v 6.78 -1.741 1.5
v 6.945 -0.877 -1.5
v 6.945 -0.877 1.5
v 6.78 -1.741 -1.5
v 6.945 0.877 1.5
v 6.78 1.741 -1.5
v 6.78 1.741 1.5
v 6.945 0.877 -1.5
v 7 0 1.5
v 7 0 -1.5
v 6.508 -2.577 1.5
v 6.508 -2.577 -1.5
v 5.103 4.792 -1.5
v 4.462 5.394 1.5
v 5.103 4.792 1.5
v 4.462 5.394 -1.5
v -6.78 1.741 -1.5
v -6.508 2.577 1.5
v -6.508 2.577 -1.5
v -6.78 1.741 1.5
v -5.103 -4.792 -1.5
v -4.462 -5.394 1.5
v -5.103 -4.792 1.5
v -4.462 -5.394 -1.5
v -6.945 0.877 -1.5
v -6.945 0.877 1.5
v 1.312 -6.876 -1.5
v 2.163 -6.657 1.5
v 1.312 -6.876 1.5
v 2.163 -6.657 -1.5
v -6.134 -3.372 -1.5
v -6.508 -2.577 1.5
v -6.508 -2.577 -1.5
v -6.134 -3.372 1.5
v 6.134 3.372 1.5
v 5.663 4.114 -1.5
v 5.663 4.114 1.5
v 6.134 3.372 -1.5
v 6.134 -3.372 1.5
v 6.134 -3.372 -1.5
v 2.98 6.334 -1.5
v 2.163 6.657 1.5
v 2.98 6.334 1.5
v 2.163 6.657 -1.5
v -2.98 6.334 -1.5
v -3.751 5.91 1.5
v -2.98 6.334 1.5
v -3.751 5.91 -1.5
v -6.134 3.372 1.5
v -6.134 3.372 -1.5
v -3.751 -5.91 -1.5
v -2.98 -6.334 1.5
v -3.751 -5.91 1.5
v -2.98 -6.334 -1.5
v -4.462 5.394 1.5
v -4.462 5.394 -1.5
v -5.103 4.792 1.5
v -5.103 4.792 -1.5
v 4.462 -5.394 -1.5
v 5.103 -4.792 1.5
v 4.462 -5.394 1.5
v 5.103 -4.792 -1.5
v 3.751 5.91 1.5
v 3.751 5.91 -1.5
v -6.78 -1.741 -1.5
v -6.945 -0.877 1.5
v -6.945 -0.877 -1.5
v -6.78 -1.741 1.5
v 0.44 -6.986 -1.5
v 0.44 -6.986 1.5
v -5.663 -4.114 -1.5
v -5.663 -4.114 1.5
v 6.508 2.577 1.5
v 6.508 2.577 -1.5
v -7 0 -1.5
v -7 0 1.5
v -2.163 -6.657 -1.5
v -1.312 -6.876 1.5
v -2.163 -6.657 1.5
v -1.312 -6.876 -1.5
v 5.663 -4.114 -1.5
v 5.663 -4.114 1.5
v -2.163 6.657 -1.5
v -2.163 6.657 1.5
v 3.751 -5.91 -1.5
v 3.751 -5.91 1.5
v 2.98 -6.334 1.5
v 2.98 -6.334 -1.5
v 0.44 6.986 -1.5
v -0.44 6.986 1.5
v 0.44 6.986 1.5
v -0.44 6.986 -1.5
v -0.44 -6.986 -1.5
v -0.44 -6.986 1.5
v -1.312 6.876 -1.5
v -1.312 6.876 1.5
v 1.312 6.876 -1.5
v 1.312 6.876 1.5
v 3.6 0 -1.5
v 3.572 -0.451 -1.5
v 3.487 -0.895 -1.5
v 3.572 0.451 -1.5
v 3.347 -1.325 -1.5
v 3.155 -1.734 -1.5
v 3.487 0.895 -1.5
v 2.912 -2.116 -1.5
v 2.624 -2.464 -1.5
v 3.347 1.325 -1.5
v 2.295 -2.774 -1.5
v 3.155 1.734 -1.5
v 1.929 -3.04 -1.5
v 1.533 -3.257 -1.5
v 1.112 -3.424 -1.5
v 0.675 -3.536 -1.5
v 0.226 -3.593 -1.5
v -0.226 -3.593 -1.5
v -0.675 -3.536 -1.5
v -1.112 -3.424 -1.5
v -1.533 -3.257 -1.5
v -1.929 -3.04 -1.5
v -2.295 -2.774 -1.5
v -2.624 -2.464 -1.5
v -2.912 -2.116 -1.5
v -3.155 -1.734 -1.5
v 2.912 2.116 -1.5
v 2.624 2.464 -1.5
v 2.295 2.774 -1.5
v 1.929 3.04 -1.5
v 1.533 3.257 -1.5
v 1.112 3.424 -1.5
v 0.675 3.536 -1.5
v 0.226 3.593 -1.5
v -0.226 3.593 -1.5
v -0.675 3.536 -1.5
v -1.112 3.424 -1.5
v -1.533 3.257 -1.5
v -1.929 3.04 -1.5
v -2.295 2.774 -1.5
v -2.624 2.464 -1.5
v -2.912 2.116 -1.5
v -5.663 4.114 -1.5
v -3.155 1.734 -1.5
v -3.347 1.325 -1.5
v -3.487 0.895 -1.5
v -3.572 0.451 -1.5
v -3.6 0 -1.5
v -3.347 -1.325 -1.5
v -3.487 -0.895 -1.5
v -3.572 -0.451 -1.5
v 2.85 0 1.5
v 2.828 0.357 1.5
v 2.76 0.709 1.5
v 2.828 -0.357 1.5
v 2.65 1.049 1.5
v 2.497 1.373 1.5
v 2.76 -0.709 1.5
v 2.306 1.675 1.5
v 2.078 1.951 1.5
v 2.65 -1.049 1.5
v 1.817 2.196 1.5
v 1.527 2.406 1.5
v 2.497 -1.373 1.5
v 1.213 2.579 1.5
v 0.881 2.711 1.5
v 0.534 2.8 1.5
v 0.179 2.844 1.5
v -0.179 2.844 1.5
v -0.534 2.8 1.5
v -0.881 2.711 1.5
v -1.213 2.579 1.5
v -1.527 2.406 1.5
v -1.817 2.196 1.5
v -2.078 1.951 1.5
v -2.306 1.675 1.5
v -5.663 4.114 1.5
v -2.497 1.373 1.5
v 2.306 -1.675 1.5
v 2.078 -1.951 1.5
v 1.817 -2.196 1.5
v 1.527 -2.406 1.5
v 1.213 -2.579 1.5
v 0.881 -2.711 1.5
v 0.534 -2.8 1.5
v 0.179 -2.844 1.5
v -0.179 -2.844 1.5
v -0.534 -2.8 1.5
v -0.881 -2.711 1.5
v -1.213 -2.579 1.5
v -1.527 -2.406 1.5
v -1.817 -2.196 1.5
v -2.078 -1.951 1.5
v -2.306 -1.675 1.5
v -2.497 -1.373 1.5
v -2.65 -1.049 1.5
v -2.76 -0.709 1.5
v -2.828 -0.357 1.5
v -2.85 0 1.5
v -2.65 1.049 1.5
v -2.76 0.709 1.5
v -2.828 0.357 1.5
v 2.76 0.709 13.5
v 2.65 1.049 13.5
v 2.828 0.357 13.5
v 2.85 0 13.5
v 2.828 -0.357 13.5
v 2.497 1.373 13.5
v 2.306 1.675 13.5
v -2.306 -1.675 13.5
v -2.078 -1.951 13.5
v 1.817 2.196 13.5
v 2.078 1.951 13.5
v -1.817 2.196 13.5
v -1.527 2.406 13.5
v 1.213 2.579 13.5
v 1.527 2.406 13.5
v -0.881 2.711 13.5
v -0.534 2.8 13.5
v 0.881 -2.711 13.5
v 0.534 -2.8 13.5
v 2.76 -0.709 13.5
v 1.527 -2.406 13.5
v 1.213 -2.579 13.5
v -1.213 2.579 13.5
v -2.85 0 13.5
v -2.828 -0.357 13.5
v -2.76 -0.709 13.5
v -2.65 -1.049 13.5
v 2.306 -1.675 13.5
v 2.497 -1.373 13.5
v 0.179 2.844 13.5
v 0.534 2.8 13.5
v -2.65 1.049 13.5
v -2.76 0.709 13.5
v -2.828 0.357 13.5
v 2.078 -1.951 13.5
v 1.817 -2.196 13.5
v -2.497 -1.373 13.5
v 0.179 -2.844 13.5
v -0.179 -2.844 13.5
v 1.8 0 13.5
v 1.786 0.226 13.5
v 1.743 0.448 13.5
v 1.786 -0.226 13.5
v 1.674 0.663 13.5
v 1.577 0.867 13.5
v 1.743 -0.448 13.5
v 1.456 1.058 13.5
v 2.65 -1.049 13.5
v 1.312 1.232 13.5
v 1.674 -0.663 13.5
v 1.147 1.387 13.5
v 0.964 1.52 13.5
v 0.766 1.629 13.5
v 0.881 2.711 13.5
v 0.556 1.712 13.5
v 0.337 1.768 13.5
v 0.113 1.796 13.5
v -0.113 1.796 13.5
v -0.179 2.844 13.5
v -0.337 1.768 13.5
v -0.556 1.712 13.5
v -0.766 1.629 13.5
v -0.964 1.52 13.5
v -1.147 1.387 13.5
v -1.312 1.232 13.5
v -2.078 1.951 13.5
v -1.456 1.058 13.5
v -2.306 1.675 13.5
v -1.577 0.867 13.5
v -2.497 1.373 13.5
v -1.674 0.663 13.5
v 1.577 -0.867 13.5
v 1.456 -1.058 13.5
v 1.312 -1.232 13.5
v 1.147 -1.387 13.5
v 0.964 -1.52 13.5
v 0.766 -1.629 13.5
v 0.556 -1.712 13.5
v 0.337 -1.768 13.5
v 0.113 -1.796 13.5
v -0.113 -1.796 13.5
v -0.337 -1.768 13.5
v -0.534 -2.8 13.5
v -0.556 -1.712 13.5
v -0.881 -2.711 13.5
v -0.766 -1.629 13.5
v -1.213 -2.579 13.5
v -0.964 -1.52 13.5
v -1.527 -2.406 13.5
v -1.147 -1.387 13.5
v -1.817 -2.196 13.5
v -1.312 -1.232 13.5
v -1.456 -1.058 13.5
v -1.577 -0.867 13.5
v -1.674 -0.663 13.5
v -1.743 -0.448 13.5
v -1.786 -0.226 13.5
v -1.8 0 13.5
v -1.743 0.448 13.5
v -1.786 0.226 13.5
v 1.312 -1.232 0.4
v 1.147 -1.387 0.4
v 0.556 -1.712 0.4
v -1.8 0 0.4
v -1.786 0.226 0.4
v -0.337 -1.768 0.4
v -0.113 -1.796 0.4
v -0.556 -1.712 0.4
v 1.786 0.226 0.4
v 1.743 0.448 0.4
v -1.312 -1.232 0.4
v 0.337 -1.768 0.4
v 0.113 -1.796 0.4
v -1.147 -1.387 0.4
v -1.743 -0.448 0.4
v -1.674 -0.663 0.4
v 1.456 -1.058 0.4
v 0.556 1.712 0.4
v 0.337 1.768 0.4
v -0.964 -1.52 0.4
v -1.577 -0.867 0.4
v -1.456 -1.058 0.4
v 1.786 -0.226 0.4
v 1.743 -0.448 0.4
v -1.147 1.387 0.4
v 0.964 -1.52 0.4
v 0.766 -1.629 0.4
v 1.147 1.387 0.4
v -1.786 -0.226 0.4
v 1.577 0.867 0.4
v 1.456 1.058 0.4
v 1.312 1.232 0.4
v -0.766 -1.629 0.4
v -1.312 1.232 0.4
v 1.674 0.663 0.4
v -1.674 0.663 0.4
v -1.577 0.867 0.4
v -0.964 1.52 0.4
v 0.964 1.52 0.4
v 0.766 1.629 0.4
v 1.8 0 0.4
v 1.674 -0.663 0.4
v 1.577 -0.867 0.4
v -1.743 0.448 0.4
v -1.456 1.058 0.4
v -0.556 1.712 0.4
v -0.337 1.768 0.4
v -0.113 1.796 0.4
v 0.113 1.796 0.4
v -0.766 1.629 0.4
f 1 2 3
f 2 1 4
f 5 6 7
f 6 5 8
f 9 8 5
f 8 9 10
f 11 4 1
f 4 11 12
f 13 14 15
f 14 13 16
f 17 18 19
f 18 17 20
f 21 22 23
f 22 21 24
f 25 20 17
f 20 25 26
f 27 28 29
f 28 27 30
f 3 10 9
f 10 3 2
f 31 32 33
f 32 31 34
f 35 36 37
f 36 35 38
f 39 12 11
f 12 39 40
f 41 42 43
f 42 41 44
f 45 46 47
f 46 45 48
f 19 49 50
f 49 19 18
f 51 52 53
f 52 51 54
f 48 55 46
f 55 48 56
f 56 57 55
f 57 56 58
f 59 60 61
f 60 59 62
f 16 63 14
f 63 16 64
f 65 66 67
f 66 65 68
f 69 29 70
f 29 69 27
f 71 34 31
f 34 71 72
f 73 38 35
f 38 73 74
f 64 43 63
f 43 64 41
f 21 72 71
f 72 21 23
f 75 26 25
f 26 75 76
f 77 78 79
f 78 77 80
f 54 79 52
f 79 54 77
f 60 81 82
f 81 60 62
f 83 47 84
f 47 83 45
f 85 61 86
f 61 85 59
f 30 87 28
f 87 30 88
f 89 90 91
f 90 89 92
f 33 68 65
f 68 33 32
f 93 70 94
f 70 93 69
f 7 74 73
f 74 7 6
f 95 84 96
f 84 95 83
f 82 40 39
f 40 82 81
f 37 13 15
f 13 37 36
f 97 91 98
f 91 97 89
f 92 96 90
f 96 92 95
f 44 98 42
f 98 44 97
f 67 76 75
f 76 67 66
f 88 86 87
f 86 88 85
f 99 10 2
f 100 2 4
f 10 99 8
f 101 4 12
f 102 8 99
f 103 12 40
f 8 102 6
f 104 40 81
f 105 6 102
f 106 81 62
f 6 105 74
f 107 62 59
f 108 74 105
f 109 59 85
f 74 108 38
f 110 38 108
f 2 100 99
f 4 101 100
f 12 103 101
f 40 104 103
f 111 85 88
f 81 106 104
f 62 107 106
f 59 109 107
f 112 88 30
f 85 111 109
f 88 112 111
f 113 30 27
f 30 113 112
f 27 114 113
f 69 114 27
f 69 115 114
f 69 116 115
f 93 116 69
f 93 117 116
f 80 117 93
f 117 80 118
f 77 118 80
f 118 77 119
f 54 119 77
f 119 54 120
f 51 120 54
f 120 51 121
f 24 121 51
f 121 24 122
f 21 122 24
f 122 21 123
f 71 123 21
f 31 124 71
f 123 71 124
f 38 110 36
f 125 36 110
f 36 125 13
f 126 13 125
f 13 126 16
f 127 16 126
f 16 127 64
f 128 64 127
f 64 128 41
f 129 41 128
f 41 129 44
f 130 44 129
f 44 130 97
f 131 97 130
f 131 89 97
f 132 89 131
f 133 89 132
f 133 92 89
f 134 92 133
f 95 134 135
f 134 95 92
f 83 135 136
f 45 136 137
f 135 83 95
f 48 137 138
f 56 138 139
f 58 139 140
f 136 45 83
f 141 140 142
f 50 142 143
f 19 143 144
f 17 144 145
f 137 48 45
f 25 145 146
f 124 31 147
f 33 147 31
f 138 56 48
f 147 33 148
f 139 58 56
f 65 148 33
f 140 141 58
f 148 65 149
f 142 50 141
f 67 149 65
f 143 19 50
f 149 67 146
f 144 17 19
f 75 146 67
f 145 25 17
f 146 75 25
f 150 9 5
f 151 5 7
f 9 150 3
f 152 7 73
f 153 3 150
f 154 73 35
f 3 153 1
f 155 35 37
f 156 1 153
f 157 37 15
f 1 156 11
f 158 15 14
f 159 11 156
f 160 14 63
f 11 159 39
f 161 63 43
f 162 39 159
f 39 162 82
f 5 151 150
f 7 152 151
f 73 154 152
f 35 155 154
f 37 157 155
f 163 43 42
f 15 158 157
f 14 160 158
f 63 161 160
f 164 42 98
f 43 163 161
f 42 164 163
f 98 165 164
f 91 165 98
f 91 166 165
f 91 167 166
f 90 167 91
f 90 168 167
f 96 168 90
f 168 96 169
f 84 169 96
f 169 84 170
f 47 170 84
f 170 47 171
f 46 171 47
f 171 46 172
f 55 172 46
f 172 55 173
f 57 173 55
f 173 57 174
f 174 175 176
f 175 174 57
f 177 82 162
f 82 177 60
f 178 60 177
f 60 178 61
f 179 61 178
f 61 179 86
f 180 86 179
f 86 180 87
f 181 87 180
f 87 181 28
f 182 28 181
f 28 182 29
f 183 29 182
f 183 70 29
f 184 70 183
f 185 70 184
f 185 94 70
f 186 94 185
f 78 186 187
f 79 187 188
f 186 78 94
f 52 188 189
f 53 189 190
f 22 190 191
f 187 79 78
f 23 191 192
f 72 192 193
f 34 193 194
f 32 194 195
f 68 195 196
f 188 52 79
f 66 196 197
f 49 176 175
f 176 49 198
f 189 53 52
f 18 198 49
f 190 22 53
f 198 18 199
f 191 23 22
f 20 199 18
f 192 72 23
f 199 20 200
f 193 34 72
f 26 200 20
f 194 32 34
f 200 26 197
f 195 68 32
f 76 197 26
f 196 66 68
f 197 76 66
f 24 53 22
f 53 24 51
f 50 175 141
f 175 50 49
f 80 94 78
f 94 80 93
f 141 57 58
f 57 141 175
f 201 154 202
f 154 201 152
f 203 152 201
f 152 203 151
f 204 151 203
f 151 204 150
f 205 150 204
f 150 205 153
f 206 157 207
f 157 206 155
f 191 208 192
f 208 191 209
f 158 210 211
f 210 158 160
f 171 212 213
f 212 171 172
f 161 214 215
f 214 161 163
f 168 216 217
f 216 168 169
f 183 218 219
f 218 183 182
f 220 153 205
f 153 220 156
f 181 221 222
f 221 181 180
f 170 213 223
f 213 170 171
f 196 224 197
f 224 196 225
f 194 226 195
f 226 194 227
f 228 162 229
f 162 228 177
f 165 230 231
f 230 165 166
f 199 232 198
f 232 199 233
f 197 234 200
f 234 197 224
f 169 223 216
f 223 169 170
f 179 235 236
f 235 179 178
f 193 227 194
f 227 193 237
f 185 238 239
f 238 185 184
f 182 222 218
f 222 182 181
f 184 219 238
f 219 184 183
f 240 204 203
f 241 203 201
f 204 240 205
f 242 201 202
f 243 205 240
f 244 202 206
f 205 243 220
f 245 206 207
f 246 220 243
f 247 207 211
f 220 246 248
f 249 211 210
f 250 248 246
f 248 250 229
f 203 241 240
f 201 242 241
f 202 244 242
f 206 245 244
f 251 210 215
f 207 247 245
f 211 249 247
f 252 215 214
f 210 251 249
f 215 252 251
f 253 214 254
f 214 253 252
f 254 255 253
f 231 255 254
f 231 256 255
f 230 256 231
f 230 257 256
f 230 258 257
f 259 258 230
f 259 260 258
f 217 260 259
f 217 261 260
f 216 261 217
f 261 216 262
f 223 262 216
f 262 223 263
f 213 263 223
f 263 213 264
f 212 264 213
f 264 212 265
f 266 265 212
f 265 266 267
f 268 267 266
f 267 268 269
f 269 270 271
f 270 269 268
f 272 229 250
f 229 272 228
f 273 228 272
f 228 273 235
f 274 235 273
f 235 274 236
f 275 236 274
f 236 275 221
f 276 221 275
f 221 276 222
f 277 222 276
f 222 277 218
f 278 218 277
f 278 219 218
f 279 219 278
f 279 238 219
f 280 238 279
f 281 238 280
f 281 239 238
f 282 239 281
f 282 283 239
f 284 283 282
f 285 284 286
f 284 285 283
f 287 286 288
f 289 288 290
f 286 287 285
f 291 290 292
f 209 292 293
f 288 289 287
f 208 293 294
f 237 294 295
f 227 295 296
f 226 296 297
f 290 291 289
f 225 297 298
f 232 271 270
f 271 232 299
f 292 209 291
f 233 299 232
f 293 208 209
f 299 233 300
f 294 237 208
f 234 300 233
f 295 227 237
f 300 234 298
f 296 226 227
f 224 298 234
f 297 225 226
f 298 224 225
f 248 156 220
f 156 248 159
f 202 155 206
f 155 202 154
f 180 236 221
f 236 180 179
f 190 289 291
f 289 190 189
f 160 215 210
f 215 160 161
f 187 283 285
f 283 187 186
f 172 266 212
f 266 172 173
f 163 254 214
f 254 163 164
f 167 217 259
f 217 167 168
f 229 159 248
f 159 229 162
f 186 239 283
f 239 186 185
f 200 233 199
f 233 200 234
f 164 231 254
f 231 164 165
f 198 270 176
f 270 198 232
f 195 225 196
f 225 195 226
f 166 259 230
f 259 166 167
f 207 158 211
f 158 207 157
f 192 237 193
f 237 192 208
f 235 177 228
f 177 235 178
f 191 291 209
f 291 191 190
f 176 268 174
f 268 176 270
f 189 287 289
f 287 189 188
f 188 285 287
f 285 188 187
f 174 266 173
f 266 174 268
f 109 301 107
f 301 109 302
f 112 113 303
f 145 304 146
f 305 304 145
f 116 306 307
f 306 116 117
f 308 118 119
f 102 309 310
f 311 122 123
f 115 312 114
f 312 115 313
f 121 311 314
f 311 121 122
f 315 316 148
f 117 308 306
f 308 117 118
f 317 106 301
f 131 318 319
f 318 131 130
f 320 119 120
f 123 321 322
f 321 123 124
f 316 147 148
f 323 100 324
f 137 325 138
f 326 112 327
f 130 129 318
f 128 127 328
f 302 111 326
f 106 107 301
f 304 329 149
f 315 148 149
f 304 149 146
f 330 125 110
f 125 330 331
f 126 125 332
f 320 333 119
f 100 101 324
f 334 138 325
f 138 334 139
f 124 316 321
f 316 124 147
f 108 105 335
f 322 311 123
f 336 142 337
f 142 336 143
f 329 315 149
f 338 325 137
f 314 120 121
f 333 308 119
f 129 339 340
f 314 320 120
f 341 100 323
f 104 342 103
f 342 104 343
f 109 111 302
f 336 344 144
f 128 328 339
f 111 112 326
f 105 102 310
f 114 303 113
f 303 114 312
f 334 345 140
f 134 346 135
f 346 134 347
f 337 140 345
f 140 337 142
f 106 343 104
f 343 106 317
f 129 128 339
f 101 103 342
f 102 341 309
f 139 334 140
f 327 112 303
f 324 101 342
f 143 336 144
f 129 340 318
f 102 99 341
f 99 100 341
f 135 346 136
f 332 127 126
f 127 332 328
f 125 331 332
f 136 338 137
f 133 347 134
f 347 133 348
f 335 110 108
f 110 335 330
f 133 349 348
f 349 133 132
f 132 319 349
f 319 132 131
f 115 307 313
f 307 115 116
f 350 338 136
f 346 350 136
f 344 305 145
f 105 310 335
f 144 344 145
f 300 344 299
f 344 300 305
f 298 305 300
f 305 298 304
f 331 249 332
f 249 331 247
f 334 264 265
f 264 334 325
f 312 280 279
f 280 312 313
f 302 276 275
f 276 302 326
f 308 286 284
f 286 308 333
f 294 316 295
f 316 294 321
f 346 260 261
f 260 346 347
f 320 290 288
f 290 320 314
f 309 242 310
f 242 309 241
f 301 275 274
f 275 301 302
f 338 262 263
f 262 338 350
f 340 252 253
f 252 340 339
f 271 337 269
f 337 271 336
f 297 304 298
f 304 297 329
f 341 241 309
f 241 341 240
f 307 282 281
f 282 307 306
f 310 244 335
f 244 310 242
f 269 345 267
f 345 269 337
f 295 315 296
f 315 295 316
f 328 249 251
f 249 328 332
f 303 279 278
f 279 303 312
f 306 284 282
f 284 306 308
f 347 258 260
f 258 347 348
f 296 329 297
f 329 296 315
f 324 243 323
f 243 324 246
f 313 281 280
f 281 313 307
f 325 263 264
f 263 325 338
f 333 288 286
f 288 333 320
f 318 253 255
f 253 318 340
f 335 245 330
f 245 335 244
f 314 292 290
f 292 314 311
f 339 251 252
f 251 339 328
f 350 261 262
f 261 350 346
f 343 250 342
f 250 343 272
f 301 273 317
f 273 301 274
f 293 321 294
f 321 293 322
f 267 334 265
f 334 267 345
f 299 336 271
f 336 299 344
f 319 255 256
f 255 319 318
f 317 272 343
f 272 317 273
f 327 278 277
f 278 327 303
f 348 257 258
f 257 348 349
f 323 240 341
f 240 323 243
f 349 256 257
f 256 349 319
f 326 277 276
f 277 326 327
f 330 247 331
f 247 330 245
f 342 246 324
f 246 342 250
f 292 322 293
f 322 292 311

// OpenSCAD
$fn = 50;


difference() {
	union() {
		translate(v = [0, 0, -1.5000000000]) {
			cylinder(h = 3, r = 7.0000000000);
		}
		translate(v = [0, 0, -1.5000000000]) {
			cylinder(h = 15, r = 2.8500000000);
		}
	}
	union() {
		translate(v = [0, 0, -1.5000000000]) {
			rotate(a = [0, 180, 0]) {
				difference() {
					union() {
						translate(v = [0, 0, -15.0000000000]) {
							cylinder(h = 15, r = 1.5000000000);
						}
						translate(v = [0, 0, -1.9000000000]) {
							cylinder(h = 1.9000000000, r1 = 1.8000000000, r2 = 3.6000000000);
						}
						translate(v = [0, 0, -15.0000000000]) {
							cylinder(h = 15, r = 1.8000000000);
						}
						translate(v = [0, 0, -15.0000000000]) {
							cylinder(h = 15, r = 1.5000000000);
						}
					}
					union();
				}
			}
		}
		translate(v = [0, 0, -50.0000000000]) {
			cylinder(h = 100, r = 1.8000000000);
		}
	}
}
